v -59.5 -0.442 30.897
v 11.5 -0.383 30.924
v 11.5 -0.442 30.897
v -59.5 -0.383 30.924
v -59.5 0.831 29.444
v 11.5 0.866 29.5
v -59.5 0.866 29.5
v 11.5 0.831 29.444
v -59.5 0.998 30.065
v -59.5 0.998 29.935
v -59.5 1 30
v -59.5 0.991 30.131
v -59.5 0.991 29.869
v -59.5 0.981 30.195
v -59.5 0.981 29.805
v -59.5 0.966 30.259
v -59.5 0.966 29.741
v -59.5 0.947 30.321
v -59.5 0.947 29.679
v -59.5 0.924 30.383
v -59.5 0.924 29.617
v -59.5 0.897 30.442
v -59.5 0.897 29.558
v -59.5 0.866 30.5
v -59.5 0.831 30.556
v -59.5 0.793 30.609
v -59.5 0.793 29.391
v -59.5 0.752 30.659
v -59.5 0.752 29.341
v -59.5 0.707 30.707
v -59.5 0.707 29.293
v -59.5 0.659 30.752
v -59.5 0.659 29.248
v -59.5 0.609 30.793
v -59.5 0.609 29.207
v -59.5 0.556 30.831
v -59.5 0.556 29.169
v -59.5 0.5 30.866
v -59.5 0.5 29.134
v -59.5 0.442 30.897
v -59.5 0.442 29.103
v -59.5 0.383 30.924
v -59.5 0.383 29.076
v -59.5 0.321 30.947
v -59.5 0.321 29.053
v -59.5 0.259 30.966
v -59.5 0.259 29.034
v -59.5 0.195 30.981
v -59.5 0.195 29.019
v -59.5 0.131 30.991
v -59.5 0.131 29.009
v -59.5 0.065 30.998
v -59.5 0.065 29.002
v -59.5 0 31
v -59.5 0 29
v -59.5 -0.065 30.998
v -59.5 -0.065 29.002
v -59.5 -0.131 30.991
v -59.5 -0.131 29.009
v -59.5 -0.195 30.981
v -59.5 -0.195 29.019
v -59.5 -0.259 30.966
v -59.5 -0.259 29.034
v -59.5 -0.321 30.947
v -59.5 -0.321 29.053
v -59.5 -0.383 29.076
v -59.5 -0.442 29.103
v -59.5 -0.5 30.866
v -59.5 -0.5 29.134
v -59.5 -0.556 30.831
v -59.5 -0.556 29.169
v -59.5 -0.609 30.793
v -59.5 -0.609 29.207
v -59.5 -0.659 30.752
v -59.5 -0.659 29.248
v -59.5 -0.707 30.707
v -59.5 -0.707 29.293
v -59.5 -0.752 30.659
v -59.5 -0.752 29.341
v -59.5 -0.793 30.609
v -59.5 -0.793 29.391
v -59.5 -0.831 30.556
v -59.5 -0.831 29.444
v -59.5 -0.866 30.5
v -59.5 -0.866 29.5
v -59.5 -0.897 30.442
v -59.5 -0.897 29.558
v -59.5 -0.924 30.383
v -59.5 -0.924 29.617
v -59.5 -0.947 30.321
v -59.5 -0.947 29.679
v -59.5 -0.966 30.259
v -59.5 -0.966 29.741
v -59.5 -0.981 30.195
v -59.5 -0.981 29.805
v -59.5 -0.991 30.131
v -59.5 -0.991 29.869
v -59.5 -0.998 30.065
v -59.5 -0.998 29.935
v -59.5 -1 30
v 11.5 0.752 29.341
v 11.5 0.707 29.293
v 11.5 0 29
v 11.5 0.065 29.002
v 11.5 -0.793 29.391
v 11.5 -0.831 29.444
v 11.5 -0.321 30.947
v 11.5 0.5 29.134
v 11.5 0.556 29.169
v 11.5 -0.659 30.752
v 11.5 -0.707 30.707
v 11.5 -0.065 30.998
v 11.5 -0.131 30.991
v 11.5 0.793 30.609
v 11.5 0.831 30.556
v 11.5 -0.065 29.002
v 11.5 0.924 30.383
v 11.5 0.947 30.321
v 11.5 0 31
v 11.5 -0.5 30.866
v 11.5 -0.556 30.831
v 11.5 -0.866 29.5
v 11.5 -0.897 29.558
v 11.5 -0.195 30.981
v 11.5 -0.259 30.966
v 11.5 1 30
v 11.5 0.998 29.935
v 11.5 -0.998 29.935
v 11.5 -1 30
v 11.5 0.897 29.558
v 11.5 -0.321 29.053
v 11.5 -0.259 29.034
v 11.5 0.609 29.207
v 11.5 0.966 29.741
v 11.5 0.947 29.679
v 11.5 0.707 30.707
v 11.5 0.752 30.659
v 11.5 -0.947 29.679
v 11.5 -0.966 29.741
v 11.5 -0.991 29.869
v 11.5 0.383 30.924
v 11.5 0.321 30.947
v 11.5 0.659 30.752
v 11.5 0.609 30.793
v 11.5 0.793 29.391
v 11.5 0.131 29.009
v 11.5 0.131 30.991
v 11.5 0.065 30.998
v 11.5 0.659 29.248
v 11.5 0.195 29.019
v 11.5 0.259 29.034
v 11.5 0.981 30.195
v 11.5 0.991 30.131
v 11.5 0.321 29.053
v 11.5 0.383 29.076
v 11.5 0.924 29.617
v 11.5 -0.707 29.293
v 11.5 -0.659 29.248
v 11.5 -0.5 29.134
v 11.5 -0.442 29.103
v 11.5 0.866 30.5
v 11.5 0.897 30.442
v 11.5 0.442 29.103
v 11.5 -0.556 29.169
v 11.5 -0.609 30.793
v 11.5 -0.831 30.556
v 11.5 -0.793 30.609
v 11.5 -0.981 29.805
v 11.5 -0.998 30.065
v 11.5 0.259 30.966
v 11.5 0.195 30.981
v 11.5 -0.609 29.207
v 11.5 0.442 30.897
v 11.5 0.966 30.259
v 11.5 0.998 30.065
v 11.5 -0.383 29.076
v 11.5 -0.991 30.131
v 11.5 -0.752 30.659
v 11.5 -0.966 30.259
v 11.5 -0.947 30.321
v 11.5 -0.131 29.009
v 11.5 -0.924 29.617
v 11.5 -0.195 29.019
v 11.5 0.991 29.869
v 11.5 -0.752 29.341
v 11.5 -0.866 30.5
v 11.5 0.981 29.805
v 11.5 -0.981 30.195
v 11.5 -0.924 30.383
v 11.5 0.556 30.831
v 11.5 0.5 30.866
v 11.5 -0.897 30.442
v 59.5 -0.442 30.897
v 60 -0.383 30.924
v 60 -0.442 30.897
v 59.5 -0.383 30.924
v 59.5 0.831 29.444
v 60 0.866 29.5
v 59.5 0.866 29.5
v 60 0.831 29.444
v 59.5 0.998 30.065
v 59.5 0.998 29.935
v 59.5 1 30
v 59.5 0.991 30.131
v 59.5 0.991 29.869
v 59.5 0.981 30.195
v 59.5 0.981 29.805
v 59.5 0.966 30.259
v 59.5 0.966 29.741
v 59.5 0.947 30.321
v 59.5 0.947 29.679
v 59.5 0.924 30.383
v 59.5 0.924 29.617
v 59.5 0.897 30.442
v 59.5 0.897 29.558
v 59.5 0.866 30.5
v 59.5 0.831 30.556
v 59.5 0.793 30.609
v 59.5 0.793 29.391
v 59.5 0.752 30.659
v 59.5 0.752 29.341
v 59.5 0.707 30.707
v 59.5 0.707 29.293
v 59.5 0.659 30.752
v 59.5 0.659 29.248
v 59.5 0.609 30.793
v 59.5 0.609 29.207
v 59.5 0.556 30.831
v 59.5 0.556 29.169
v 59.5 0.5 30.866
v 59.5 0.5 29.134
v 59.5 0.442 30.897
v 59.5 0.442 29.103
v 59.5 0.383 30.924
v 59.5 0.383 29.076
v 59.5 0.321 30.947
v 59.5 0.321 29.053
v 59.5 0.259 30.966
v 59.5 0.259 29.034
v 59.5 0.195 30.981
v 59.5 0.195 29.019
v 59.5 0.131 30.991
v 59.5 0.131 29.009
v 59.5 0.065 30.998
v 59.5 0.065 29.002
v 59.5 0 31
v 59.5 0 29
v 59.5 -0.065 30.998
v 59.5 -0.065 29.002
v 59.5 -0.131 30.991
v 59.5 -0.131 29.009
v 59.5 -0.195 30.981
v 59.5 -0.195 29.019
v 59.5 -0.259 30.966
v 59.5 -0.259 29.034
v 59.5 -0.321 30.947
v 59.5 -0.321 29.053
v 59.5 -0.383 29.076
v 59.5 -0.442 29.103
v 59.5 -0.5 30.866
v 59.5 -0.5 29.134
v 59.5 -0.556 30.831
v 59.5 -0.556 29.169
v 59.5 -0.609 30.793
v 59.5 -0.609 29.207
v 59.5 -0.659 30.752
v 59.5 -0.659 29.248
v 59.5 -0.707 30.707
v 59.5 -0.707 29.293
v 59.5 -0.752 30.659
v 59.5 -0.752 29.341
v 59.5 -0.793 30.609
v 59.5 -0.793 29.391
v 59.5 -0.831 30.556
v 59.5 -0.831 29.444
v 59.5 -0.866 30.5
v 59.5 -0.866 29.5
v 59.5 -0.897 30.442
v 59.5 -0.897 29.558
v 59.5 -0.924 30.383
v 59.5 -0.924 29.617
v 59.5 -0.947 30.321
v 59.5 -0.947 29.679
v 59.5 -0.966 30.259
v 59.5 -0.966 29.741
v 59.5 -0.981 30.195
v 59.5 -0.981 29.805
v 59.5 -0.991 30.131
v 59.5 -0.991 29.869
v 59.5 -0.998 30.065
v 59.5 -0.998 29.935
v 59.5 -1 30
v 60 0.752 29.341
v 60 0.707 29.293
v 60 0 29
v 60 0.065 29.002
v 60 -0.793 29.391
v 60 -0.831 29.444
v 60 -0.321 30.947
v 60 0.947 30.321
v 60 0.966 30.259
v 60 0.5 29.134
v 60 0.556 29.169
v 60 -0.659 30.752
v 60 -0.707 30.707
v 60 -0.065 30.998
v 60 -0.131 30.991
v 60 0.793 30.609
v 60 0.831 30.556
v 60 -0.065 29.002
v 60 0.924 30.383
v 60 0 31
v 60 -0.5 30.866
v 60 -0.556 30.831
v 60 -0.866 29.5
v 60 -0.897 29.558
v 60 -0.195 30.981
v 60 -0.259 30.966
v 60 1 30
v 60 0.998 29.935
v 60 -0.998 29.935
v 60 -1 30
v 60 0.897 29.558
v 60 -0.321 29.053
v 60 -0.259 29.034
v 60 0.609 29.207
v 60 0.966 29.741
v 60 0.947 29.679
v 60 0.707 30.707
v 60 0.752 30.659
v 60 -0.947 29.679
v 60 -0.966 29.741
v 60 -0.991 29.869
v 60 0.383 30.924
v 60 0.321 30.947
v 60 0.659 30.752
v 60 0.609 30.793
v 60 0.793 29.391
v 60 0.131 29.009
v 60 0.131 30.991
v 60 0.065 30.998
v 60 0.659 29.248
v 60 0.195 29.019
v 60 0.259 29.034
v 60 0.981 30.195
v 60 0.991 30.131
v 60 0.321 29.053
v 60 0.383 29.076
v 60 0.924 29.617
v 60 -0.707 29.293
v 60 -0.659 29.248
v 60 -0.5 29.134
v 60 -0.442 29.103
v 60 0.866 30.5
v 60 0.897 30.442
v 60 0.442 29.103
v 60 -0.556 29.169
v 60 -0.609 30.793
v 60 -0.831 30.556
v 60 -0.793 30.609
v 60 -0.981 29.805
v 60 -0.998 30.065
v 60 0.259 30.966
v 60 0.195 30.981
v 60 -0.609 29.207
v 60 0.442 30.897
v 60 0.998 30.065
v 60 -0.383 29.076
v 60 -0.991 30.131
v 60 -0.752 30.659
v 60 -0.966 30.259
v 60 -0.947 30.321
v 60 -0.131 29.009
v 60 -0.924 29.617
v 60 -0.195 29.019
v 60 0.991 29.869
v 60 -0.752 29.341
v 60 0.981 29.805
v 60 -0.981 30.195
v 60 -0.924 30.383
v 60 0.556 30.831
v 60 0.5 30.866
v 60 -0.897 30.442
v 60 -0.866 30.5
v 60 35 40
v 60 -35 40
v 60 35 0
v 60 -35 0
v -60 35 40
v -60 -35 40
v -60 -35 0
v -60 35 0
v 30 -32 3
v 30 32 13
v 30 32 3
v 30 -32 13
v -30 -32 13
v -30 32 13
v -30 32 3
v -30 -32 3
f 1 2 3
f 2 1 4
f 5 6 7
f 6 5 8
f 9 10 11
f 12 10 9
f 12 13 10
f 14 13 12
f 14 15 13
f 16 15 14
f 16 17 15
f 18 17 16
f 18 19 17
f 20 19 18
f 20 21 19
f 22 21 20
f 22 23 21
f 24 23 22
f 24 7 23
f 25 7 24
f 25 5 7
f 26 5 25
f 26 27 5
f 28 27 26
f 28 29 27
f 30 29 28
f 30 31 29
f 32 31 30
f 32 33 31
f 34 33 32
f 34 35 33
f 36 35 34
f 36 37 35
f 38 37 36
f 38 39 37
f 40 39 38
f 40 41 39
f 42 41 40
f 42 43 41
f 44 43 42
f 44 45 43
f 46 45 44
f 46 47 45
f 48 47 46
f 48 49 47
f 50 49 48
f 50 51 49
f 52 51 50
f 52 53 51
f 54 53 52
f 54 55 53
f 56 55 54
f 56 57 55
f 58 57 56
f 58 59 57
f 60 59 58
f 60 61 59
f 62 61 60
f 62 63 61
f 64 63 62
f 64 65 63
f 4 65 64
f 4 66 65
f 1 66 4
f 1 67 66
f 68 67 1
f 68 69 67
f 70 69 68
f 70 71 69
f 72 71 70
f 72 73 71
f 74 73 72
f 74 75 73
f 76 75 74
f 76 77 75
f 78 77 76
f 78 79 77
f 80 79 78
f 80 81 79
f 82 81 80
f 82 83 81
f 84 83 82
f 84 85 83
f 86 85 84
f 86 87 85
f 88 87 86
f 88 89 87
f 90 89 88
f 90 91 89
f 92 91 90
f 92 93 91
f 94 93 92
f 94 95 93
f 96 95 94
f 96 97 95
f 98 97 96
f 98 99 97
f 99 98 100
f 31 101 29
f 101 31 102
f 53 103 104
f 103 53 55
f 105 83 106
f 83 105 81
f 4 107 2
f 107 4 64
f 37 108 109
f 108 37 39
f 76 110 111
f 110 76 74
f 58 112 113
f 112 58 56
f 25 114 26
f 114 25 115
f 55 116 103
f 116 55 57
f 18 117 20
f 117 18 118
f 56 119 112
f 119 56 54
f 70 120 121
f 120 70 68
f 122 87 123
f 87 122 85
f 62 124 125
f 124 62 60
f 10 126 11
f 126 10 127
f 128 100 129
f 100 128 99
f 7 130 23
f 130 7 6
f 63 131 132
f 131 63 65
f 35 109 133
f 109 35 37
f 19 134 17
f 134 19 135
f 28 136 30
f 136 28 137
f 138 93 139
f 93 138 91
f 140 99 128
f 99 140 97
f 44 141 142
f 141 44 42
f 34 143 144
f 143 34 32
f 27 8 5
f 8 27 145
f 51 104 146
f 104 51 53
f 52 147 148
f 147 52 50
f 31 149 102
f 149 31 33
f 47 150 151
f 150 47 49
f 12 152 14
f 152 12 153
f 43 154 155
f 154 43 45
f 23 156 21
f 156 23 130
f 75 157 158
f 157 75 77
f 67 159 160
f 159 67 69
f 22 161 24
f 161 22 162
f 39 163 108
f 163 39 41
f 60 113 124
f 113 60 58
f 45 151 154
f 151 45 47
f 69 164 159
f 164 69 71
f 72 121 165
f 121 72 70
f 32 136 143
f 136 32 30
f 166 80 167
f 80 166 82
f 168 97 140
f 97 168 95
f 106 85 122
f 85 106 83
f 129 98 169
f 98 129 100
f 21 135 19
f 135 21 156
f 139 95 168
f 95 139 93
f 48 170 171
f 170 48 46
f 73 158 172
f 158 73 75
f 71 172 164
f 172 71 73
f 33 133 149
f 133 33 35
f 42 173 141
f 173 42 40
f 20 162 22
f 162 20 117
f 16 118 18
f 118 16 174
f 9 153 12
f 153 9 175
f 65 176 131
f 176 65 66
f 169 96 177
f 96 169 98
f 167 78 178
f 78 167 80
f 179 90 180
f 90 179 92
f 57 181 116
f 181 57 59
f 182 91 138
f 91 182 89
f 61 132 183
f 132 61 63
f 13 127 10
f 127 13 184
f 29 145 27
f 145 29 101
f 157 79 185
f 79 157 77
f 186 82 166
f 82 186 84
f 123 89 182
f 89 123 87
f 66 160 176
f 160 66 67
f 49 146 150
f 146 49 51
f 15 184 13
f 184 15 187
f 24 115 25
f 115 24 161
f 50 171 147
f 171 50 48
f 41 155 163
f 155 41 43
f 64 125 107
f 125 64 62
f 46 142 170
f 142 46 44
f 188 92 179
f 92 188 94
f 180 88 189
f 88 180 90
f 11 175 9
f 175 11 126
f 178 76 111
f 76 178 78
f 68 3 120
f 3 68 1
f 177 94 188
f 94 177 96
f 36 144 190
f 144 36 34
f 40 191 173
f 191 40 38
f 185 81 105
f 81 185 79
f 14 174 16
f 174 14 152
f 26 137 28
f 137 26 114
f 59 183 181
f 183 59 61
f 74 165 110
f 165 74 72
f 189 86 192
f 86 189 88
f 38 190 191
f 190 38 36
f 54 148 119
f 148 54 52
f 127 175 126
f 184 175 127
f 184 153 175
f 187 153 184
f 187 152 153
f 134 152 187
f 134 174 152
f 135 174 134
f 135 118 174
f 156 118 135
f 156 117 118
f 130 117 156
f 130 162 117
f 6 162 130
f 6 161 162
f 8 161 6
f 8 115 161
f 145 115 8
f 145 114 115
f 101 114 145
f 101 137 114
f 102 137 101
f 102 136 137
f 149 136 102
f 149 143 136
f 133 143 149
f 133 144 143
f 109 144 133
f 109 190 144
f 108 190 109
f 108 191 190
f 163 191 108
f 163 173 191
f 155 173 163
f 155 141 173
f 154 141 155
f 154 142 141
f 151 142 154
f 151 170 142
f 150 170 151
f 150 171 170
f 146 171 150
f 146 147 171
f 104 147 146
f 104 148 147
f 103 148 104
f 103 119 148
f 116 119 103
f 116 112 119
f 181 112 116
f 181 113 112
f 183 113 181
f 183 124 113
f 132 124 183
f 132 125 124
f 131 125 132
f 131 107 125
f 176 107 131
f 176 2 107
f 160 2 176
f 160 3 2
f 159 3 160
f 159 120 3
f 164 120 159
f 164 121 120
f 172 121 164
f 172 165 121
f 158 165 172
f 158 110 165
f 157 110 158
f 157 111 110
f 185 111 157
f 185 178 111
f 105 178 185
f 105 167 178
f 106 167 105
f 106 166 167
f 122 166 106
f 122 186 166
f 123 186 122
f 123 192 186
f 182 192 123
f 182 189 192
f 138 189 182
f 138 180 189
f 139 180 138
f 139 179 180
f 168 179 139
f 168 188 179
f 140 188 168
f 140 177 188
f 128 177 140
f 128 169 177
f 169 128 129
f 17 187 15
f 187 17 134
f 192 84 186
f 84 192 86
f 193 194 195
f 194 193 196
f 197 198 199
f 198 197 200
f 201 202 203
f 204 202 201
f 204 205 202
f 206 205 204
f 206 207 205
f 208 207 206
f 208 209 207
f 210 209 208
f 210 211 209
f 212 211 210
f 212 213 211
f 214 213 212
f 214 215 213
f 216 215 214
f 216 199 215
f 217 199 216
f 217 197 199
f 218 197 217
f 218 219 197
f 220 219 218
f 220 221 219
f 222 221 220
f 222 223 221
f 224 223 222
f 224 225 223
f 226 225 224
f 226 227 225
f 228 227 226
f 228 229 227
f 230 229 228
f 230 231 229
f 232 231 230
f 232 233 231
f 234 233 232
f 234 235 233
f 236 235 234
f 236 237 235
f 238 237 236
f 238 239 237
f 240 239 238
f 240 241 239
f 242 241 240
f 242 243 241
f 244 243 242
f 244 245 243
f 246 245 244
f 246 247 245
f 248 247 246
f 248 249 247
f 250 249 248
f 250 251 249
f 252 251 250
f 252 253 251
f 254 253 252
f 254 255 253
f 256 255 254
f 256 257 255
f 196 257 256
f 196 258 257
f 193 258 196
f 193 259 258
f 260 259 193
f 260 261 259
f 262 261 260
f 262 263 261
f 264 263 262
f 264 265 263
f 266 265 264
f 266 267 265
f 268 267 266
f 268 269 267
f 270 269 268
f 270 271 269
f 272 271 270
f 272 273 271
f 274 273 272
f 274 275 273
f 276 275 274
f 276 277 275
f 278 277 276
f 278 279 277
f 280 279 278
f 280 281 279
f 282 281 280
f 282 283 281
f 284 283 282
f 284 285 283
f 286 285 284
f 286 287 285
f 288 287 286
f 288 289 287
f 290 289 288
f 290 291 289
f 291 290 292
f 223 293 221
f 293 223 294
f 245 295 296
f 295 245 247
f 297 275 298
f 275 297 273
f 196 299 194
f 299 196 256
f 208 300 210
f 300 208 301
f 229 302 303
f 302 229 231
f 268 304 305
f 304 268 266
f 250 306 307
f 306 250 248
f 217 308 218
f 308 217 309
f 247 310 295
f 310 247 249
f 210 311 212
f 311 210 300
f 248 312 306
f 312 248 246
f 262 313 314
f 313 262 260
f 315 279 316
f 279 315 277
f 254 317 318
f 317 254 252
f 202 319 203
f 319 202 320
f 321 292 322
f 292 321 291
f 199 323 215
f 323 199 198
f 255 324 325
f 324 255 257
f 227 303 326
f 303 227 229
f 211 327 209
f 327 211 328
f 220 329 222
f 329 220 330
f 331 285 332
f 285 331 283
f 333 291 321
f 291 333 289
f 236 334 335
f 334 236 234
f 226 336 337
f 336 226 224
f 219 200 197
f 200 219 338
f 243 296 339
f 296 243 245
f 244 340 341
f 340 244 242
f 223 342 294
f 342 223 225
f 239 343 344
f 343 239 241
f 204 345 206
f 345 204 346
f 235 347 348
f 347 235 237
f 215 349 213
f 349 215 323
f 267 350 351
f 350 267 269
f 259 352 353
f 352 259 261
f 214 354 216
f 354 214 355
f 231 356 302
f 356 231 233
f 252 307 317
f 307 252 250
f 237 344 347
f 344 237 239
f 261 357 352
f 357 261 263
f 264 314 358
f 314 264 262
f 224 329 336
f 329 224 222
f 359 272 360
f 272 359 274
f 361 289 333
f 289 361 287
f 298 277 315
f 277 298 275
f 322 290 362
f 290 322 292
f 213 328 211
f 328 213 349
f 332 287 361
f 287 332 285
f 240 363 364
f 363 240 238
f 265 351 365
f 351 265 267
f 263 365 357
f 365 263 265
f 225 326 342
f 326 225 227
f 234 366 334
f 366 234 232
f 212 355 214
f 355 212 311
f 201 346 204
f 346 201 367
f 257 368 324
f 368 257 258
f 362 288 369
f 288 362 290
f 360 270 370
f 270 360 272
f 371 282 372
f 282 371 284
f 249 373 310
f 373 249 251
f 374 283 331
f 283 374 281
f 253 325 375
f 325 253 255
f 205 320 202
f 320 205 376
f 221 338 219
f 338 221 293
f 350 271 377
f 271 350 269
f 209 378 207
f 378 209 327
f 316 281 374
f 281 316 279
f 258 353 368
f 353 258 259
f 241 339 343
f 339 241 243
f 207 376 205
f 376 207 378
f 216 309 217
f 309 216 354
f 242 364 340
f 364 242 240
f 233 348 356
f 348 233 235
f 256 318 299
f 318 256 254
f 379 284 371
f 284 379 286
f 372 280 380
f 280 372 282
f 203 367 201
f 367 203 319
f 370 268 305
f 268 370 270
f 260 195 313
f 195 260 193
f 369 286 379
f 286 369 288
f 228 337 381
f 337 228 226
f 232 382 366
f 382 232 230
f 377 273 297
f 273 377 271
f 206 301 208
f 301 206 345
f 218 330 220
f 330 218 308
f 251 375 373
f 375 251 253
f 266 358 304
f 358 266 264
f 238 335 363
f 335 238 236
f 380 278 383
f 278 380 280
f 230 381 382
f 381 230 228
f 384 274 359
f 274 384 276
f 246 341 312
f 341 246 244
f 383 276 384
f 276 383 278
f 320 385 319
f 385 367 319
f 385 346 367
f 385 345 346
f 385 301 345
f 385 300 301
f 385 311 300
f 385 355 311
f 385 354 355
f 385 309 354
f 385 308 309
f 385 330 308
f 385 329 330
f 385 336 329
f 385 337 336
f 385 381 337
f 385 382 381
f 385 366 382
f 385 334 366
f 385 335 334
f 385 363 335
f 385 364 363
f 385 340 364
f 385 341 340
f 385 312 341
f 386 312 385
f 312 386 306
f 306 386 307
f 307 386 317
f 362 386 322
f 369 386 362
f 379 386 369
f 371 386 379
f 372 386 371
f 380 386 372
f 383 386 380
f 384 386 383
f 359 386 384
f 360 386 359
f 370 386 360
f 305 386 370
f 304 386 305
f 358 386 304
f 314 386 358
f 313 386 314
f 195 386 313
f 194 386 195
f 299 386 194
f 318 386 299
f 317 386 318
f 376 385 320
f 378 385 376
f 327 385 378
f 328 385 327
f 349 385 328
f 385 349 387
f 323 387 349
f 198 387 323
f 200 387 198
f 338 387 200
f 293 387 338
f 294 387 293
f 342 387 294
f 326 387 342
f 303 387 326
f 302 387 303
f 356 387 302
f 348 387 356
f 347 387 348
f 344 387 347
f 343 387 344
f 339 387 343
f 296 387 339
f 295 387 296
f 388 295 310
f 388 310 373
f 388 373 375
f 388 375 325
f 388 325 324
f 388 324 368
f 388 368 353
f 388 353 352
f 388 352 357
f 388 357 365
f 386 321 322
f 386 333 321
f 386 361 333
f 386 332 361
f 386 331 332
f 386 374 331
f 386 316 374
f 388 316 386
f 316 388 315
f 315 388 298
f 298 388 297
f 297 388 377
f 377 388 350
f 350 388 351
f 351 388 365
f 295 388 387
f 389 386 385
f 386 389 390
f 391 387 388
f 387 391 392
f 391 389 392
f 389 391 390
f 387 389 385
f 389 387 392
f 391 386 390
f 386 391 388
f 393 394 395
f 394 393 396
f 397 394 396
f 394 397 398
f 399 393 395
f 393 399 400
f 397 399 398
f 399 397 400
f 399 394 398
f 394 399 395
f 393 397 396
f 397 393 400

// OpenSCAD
// Mini horizontal gel-electrophoresis box - buffer tank
// Print orientation: tank rests on XY plane at z = 0, builds upward (+Z)

// ---------------- Parameters ----------------
tank_x      = 120;   // outer length in X (mm)
tank_y      = 70;    // outer width in Y (mm)
tank_h      = 40;    // outer height in Z (mm)
wall        = 3;     // wall thickness (mm)
floor       = 3;     // floor thickness (mm)

platform_x  = 60;    // platform length in X (mm), centred
platform_y  = tank_y - 2 * wall;  // platform spans full inner width (mm)
platform_z  = 13;    // platform top height above outer base (mm)

hole_d      = 2;     // electrode hole diameter (mm)
hole_y      = 0;     // hole centre Y (mm)
hole_z      = 30;    // hole centre Z (mm)

eps         = 0.5;   // cutter overshoot past faces (mm)
$fn         = 96;    // curve resolution

// ---------------- Derived ----------------
inner_h = tank_h - floor;              // 37 mm inner floor-to-top height
// Platform sits on the floor, so its bottom is at z = floor = 3

// ---------------- Model ----------------
difference() {
    // Tank body: open-top rectangular box with floor
    translate([-tank_x / 2, -tank_y / 2, 0])
        cube([tank_x, tank_y, tank_h]);

    // Gel-tray platform, centred in X, spanning full inner width
    translate([-platform_x / 2, -platform_y / 2, floor])
        cube([platform_x, platform_y, platform_z - floor]);

    // Horizontal electrode holes through each end wall (at X = +/- 60)
    for (sx = [-1, 1])
        translate([sx * (tank_x / 2 - eps), hole_y, hole_z])
            rotate([0, 90, 0])
                cylinder(d = hole_d, h = tank_y + 2 * eps);
}
